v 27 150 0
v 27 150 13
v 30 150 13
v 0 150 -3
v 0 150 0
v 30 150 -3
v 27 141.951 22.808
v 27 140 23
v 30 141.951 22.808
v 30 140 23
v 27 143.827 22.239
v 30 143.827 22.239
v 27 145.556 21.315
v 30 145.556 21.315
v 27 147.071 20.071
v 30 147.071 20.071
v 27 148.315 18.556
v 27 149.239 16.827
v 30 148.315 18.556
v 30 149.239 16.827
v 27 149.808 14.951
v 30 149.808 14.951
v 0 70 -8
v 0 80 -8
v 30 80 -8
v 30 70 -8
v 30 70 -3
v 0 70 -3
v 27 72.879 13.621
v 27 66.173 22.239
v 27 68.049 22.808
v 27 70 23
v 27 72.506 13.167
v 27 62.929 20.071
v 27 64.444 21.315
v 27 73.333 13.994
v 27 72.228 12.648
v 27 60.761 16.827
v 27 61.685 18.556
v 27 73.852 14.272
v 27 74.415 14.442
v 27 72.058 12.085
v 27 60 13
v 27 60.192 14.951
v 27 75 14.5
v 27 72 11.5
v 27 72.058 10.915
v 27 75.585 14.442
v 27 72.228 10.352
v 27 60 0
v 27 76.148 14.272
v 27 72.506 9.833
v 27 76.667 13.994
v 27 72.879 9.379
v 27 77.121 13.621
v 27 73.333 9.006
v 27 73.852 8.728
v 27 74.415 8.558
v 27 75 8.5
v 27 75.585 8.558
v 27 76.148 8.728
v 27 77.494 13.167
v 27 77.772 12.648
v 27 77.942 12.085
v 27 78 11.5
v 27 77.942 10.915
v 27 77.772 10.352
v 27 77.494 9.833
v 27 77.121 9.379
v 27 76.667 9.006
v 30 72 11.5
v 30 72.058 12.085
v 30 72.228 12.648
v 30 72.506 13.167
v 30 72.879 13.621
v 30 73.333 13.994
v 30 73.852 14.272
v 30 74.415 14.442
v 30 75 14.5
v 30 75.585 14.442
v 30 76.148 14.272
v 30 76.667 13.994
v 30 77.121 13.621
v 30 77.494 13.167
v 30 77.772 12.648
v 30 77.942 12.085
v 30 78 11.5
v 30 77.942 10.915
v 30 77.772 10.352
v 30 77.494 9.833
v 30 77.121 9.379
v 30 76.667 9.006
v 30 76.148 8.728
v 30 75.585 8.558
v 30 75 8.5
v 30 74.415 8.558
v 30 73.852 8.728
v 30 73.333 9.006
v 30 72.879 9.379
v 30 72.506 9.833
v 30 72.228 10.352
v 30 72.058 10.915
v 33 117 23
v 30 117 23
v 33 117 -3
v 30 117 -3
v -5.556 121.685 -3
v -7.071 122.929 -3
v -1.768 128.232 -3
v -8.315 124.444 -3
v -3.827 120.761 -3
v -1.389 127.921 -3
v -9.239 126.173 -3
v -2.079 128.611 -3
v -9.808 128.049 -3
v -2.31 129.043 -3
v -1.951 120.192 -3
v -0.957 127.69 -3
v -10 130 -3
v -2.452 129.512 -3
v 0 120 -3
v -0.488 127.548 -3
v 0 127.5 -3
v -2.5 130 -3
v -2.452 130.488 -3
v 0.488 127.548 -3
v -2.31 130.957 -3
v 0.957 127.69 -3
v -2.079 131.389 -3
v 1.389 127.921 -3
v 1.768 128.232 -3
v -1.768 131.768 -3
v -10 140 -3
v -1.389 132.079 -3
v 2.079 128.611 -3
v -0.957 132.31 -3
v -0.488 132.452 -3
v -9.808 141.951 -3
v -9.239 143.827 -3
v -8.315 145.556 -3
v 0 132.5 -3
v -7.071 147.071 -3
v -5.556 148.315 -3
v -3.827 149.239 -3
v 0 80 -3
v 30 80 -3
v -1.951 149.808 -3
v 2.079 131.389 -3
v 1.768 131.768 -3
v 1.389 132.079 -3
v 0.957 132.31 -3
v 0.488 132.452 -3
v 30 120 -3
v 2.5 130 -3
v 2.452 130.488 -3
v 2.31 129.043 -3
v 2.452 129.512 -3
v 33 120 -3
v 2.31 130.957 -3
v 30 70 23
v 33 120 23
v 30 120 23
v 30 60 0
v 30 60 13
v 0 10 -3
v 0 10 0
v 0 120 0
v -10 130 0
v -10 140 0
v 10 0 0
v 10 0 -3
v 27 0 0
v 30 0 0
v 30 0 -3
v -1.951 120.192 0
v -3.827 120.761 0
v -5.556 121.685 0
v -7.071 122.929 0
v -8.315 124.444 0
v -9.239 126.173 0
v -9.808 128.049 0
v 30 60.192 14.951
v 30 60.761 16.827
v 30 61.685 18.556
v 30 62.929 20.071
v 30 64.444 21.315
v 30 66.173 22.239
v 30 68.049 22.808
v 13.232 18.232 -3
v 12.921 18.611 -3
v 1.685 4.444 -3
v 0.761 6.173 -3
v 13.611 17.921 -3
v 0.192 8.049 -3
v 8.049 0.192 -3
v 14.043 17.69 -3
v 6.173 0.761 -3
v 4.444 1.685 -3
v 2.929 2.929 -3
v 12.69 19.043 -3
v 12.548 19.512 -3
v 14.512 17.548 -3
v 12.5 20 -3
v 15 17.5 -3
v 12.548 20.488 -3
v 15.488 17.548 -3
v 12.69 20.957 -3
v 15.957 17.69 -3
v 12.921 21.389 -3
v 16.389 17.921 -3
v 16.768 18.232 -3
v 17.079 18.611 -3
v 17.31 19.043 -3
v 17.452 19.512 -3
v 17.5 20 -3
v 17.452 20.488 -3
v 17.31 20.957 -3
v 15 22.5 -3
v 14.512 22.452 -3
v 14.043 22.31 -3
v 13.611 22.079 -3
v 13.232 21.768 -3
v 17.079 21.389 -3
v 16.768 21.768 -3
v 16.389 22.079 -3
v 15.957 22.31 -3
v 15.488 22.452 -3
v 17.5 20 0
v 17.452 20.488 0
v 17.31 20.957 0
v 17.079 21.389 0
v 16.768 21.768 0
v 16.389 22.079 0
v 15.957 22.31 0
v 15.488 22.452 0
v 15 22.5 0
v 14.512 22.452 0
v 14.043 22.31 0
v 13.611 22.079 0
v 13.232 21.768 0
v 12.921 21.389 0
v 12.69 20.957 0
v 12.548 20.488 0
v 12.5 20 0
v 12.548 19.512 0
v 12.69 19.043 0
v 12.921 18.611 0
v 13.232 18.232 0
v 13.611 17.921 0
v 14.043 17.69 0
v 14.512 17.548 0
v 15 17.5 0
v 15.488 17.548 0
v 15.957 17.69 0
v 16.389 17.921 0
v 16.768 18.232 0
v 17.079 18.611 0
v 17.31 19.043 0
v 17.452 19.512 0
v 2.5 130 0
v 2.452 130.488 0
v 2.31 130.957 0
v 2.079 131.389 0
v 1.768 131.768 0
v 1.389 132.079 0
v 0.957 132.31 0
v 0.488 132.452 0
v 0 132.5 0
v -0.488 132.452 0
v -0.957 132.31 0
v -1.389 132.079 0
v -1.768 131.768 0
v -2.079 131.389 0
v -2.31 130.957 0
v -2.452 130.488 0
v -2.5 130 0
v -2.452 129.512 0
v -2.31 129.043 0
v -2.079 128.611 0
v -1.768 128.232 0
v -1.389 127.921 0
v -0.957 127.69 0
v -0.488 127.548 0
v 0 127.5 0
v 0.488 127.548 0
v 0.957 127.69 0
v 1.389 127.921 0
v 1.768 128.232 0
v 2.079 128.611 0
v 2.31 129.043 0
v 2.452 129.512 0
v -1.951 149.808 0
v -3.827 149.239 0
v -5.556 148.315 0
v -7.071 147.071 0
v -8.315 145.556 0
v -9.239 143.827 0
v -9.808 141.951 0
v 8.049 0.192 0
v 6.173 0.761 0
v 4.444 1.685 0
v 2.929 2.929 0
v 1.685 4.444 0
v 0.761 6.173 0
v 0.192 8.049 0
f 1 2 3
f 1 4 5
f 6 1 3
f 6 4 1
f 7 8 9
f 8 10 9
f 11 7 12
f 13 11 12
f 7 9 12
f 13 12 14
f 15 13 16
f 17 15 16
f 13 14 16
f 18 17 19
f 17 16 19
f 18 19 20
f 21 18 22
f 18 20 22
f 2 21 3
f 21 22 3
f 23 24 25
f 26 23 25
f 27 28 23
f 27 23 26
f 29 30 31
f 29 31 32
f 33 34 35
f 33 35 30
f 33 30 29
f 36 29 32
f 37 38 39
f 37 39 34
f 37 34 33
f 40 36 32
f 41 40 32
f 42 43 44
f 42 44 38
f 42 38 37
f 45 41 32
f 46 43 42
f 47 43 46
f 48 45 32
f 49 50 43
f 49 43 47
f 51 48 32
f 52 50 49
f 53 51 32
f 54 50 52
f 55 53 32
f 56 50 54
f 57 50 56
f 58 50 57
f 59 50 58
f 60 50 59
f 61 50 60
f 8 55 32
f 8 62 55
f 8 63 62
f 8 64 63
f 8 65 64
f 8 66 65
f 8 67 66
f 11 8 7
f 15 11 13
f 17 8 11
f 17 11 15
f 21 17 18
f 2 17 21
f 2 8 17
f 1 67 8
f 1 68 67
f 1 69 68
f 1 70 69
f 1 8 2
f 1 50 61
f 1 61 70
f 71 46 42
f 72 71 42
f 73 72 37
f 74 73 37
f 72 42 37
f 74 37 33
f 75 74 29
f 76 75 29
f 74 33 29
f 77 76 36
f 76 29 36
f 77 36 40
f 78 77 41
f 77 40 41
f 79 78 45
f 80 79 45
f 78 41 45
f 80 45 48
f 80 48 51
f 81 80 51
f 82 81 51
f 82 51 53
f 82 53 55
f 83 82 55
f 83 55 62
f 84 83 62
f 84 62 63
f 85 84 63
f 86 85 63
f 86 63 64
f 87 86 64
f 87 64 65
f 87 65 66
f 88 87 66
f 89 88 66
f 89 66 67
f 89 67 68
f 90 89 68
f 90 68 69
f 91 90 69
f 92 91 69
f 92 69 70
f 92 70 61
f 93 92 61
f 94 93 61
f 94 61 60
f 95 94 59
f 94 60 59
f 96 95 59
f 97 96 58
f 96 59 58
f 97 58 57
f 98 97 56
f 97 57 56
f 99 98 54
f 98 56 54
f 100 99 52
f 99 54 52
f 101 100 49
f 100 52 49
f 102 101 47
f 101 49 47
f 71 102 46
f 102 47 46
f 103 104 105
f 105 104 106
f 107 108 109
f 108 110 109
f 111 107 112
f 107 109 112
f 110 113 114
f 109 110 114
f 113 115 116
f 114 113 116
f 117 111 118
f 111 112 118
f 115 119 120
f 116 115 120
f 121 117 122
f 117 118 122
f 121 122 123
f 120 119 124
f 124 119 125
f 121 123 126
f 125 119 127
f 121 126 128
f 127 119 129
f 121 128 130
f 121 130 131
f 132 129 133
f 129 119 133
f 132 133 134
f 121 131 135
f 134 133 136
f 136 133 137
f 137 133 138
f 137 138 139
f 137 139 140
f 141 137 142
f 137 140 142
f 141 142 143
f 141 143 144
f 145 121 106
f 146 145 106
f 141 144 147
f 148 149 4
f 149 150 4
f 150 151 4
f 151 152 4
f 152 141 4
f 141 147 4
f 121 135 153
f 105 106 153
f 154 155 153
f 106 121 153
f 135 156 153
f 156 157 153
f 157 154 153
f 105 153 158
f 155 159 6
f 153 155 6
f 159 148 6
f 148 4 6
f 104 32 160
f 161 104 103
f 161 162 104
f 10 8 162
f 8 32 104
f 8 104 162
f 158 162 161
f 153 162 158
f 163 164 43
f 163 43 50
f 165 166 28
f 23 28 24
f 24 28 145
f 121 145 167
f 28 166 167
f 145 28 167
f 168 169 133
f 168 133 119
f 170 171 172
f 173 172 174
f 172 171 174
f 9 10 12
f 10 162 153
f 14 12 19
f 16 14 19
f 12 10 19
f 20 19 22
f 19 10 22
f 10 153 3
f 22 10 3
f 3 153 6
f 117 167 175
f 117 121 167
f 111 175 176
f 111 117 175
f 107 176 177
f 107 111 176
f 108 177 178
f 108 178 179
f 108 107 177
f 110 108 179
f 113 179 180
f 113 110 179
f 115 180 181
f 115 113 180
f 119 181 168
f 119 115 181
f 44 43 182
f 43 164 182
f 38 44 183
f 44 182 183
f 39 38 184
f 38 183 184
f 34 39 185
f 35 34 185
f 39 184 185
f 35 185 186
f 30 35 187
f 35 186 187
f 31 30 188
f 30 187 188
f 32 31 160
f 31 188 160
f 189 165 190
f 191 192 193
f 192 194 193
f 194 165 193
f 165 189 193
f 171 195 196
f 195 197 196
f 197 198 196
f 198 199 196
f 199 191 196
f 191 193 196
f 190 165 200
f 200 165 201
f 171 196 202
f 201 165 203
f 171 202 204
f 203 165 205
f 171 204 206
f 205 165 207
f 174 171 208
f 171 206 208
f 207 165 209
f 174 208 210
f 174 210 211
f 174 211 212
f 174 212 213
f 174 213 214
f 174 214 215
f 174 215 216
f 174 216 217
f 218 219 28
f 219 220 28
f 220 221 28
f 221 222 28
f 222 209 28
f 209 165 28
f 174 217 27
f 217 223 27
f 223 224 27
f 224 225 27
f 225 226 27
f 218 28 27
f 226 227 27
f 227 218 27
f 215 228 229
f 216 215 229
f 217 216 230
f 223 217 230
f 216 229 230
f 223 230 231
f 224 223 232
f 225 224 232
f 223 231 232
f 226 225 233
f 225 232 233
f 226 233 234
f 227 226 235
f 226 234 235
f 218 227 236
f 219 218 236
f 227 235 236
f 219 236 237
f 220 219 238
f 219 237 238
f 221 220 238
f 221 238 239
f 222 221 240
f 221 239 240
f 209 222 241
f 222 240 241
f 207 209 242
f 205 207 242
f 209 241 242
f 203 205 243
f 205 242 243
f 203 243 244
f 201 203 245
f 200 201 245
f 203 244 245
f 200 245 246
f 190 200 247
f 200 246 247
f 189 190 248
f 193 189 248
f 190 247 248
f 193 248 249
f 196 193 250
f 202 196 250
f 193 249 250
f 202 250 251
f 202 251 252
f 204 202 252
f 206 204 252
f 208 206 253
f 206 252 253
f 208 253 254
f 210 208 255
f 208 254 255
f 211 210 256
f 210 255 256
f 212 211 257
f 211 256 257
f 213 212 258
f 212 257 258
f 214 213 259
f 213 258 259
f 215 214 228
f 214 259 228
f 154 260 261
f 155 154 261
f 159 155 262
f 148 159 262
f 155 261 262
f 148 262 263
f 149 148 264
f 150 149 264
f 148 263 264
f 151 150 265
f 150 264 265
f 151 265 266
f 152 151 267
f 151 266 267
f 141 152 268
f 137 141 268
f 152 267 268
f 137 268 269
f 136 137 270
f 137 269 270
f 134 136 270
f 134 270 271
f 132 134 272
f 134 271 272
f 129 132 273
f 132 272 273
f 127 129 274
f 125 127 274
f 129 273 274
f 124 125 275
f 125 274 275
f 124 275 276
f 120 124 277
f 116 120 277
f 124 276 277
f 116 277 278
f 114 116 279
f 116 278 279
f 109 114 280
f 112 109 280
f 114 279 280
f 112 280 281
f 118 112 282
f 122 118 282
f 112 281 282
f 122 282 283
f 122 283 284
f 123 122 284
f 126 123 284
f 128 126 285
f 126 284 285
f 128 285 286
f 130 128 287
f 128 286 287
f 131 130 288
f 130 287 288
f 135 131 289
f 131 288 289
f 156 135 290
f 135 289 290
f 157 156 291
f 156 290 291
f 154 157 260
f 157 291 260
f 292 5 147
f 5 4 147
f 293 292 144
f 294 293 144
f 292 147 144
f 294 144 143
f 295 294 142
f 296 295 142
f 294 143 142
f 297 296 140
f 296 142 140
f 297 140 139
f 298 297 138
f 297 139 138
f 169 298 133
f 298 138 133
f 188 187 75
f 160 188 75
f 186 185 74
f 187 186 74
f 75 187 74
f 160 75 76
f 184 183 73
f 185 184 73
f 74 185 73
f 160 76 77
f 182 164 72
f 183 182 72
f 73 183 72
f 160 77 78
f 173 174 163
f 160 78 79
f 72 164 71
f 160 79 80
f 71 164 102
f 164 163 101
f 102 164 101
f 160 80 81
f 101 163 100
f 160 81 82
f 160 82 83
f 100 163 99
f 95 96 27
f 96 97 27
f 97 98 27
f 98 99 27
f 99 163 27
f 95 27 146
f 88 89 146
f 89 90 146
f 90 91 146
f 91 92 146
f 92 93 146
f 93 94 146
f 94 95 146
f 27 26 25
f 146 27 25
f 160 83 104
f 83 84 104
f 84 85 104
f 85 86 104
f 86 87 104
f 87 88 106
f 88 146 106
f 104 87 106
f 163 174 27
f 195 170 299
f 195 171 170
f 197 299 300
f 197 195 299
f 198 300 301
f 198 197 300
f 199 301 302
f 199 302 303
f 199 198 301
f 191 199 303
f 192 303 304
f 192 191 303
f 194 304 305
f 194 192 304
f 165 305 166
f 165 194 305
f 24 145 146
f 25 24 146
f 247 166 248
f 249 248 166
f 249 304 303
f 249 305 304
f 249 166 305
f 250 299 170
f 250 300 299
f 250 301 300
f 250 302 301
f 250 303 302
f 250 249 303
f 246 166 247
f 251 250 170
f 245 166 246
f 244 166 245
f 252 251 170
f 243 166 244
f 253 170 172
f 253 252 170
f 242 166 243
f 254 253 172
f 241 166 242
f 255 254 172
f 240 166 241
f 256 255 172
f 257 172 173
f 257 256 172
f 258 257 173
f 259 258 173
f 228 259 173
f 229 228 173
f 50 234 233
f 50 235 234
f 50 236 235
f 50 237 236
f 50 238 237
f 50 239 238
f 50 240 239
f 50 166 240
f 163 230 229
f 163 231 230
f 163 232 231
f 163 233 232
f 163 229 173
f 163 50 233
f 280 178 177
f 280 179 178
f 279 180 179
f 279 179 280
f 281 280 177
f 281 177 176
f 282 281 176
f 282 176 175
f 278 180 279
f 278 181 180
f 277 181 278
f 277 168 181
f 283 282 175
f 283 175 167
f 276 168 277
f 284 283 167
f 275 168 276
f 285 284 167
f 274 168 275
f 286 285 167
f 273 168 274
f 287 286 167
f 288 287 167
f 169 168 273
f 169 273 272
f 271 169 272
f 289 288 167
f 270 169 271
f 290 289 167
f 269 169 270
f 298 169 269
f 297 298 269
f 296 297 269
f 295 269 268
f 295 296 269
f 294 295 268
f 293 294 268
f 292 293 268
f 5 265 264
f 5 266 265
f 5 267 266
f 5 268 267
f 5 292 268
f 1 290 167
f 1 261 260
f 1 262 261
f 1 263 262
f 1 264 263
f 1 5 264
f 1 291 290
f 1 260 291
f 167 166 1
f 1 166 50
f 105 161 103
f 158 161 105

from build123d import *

# Parameters (mm, degrees)
SKETCH1_R             = 2.5
BOSS_EXTRUDE1_DEPTH   = 3
SKETCH1_W             = 30
SKETCH1_H             = 70
BOSS_EXTRUDE1_2_DEPTH = 3
SKETCH3_W             = 30
SKETCH3_H             = 10
BOSS_EXTRUDE2_DEPTH   = 8
SKETCH4_W             = 3
SKETCH4_H             = 150
BOSS_EXTRUDE4_DEPTH   = 23
SKETCH5_R             = 3
CUT_EXTRUDE1_DEPTH    = 23
SKETCH6_W             = 26
SKETCH6_H             = 3
BOSS_EXTRUDE5_DEPTH   = 3
FILLET1_R             = 10
SKETCH7_W             = 36.729037069
SKETCH7_H             = 60
CUT_EXTRUDE2_DEPTH    = 3
FILLET2_R             = 10


with BuildPart() as part:
    # Sketch1 → Boss-Extrude1 (new body)
    with BuildSketch(Plane.XY):
        Polygon((30, 150), (0, 150), (-10, 150), (-10, 120), (0, 120), (0, 80), (30, 80), (30, 120), align=None)
        with Locations((0, 130)):
            Circle(SKETCH1_R, mode=Mode.SUBTRACT)
    extrude(amount=-BOSS_EXTRUDE1_DEPTH)



with BuildPart() as body_2:
    # Sketch1 → Boss-Extrude1 2 (new body)
    with BuildSketch(Plane.XY):
        with Locations((15, 35)):
            Rectangle(SKETCH1_W, SKETCH1_H)
        with Locations((15, 20)):
            Circle(SKETCH1_R, mode=Mode.SUBTRACT)
    extrude(amount=-BOSS_EXTRUDE1_2_DEPTH)


with BuildPart() as part_1:
    add(part.part)

    add(body_2.part)  # Boss-Extrude2 merges body 2
    # Sketch3 → Boss-Extrude2 (add)
    with BuildSketch(Plane.XY):
        with Locations((15, 75)):
            Rectangle(SKETCH3_W, SKETCH3_H)
    extrude(amount=-BOSS_EXTRUDE2_DEPTH)

    # Sketch4 → Boss-Extrude4 (add)
    with BuildSketch(Plane.XY):
        with Locations((28.5, 75)):
            Rectangle(SKETCH4_W, SKETCH4_H)
    extrude(amount=BOSS_EXTRUDE4_DEPTH)

    # Sketch5 → Cut-Extrude1 (cut)
    with BuildSketch(Plane.ZY.offset(-27)):
        with Locations(Location((11.5, 75, 0), (0, 0, 270))):
            Circle(SKETCH5_R)
    extrude(amount=-CUT_EXTRUDE1_DEPTH, mode=Mode.SUBTRACT)

    # Sketch6 → Boss-Extrude5 (add)
    with BuildSketch(Plane(origin=(30, 0, 0), x_dir=(0, 0, -1), z_dir=(1, 0, 0))):
        with Locations((-10, 118.5)):
            Rectangle(SKETCH6_W, SKETCH6_H)
    extrude(amount=BOSS_EXTRUDE5_DEPTH)

    # Fillet1
    fillet1_edges = [part_1.edges().sort_by_distance(p)[0] for p in [
        (0, 0, -1.5),
        (28.5, 0, 23),
        (28.5, 150, 23),
        (-10, 120, -1.5),
        (-10, 150, -1.5),
    ]]
    fillet(fillet1_edges, radius=FILLET1_R - 0.0001)  # a hair under: the kernel refuses the full size

    # Sketch7 → Cut-Extrude2 (cut)
    with BuildSketch(Plane(origin=(30, 0, 0), x_dir=(0, 0, -1), z_dir=(1, 0, 0))):
        with Locations((-18.364518535, 30)):
            Rectangle(SKETCH7_W, SKETCH7_H)
    extrude(amount=-CUT_EXTRUDE2_DEPTH, mode=Mode.SUBTRACT)

    # Fillet2
    fillet2_edges = [part_1.edges().sort_by_distance(p)[0] for p in [
        (28.5, 60, 23),
    ]]
    fillet(fillet2_edges, radius=FILLET2_R)


solid = part_1.part
